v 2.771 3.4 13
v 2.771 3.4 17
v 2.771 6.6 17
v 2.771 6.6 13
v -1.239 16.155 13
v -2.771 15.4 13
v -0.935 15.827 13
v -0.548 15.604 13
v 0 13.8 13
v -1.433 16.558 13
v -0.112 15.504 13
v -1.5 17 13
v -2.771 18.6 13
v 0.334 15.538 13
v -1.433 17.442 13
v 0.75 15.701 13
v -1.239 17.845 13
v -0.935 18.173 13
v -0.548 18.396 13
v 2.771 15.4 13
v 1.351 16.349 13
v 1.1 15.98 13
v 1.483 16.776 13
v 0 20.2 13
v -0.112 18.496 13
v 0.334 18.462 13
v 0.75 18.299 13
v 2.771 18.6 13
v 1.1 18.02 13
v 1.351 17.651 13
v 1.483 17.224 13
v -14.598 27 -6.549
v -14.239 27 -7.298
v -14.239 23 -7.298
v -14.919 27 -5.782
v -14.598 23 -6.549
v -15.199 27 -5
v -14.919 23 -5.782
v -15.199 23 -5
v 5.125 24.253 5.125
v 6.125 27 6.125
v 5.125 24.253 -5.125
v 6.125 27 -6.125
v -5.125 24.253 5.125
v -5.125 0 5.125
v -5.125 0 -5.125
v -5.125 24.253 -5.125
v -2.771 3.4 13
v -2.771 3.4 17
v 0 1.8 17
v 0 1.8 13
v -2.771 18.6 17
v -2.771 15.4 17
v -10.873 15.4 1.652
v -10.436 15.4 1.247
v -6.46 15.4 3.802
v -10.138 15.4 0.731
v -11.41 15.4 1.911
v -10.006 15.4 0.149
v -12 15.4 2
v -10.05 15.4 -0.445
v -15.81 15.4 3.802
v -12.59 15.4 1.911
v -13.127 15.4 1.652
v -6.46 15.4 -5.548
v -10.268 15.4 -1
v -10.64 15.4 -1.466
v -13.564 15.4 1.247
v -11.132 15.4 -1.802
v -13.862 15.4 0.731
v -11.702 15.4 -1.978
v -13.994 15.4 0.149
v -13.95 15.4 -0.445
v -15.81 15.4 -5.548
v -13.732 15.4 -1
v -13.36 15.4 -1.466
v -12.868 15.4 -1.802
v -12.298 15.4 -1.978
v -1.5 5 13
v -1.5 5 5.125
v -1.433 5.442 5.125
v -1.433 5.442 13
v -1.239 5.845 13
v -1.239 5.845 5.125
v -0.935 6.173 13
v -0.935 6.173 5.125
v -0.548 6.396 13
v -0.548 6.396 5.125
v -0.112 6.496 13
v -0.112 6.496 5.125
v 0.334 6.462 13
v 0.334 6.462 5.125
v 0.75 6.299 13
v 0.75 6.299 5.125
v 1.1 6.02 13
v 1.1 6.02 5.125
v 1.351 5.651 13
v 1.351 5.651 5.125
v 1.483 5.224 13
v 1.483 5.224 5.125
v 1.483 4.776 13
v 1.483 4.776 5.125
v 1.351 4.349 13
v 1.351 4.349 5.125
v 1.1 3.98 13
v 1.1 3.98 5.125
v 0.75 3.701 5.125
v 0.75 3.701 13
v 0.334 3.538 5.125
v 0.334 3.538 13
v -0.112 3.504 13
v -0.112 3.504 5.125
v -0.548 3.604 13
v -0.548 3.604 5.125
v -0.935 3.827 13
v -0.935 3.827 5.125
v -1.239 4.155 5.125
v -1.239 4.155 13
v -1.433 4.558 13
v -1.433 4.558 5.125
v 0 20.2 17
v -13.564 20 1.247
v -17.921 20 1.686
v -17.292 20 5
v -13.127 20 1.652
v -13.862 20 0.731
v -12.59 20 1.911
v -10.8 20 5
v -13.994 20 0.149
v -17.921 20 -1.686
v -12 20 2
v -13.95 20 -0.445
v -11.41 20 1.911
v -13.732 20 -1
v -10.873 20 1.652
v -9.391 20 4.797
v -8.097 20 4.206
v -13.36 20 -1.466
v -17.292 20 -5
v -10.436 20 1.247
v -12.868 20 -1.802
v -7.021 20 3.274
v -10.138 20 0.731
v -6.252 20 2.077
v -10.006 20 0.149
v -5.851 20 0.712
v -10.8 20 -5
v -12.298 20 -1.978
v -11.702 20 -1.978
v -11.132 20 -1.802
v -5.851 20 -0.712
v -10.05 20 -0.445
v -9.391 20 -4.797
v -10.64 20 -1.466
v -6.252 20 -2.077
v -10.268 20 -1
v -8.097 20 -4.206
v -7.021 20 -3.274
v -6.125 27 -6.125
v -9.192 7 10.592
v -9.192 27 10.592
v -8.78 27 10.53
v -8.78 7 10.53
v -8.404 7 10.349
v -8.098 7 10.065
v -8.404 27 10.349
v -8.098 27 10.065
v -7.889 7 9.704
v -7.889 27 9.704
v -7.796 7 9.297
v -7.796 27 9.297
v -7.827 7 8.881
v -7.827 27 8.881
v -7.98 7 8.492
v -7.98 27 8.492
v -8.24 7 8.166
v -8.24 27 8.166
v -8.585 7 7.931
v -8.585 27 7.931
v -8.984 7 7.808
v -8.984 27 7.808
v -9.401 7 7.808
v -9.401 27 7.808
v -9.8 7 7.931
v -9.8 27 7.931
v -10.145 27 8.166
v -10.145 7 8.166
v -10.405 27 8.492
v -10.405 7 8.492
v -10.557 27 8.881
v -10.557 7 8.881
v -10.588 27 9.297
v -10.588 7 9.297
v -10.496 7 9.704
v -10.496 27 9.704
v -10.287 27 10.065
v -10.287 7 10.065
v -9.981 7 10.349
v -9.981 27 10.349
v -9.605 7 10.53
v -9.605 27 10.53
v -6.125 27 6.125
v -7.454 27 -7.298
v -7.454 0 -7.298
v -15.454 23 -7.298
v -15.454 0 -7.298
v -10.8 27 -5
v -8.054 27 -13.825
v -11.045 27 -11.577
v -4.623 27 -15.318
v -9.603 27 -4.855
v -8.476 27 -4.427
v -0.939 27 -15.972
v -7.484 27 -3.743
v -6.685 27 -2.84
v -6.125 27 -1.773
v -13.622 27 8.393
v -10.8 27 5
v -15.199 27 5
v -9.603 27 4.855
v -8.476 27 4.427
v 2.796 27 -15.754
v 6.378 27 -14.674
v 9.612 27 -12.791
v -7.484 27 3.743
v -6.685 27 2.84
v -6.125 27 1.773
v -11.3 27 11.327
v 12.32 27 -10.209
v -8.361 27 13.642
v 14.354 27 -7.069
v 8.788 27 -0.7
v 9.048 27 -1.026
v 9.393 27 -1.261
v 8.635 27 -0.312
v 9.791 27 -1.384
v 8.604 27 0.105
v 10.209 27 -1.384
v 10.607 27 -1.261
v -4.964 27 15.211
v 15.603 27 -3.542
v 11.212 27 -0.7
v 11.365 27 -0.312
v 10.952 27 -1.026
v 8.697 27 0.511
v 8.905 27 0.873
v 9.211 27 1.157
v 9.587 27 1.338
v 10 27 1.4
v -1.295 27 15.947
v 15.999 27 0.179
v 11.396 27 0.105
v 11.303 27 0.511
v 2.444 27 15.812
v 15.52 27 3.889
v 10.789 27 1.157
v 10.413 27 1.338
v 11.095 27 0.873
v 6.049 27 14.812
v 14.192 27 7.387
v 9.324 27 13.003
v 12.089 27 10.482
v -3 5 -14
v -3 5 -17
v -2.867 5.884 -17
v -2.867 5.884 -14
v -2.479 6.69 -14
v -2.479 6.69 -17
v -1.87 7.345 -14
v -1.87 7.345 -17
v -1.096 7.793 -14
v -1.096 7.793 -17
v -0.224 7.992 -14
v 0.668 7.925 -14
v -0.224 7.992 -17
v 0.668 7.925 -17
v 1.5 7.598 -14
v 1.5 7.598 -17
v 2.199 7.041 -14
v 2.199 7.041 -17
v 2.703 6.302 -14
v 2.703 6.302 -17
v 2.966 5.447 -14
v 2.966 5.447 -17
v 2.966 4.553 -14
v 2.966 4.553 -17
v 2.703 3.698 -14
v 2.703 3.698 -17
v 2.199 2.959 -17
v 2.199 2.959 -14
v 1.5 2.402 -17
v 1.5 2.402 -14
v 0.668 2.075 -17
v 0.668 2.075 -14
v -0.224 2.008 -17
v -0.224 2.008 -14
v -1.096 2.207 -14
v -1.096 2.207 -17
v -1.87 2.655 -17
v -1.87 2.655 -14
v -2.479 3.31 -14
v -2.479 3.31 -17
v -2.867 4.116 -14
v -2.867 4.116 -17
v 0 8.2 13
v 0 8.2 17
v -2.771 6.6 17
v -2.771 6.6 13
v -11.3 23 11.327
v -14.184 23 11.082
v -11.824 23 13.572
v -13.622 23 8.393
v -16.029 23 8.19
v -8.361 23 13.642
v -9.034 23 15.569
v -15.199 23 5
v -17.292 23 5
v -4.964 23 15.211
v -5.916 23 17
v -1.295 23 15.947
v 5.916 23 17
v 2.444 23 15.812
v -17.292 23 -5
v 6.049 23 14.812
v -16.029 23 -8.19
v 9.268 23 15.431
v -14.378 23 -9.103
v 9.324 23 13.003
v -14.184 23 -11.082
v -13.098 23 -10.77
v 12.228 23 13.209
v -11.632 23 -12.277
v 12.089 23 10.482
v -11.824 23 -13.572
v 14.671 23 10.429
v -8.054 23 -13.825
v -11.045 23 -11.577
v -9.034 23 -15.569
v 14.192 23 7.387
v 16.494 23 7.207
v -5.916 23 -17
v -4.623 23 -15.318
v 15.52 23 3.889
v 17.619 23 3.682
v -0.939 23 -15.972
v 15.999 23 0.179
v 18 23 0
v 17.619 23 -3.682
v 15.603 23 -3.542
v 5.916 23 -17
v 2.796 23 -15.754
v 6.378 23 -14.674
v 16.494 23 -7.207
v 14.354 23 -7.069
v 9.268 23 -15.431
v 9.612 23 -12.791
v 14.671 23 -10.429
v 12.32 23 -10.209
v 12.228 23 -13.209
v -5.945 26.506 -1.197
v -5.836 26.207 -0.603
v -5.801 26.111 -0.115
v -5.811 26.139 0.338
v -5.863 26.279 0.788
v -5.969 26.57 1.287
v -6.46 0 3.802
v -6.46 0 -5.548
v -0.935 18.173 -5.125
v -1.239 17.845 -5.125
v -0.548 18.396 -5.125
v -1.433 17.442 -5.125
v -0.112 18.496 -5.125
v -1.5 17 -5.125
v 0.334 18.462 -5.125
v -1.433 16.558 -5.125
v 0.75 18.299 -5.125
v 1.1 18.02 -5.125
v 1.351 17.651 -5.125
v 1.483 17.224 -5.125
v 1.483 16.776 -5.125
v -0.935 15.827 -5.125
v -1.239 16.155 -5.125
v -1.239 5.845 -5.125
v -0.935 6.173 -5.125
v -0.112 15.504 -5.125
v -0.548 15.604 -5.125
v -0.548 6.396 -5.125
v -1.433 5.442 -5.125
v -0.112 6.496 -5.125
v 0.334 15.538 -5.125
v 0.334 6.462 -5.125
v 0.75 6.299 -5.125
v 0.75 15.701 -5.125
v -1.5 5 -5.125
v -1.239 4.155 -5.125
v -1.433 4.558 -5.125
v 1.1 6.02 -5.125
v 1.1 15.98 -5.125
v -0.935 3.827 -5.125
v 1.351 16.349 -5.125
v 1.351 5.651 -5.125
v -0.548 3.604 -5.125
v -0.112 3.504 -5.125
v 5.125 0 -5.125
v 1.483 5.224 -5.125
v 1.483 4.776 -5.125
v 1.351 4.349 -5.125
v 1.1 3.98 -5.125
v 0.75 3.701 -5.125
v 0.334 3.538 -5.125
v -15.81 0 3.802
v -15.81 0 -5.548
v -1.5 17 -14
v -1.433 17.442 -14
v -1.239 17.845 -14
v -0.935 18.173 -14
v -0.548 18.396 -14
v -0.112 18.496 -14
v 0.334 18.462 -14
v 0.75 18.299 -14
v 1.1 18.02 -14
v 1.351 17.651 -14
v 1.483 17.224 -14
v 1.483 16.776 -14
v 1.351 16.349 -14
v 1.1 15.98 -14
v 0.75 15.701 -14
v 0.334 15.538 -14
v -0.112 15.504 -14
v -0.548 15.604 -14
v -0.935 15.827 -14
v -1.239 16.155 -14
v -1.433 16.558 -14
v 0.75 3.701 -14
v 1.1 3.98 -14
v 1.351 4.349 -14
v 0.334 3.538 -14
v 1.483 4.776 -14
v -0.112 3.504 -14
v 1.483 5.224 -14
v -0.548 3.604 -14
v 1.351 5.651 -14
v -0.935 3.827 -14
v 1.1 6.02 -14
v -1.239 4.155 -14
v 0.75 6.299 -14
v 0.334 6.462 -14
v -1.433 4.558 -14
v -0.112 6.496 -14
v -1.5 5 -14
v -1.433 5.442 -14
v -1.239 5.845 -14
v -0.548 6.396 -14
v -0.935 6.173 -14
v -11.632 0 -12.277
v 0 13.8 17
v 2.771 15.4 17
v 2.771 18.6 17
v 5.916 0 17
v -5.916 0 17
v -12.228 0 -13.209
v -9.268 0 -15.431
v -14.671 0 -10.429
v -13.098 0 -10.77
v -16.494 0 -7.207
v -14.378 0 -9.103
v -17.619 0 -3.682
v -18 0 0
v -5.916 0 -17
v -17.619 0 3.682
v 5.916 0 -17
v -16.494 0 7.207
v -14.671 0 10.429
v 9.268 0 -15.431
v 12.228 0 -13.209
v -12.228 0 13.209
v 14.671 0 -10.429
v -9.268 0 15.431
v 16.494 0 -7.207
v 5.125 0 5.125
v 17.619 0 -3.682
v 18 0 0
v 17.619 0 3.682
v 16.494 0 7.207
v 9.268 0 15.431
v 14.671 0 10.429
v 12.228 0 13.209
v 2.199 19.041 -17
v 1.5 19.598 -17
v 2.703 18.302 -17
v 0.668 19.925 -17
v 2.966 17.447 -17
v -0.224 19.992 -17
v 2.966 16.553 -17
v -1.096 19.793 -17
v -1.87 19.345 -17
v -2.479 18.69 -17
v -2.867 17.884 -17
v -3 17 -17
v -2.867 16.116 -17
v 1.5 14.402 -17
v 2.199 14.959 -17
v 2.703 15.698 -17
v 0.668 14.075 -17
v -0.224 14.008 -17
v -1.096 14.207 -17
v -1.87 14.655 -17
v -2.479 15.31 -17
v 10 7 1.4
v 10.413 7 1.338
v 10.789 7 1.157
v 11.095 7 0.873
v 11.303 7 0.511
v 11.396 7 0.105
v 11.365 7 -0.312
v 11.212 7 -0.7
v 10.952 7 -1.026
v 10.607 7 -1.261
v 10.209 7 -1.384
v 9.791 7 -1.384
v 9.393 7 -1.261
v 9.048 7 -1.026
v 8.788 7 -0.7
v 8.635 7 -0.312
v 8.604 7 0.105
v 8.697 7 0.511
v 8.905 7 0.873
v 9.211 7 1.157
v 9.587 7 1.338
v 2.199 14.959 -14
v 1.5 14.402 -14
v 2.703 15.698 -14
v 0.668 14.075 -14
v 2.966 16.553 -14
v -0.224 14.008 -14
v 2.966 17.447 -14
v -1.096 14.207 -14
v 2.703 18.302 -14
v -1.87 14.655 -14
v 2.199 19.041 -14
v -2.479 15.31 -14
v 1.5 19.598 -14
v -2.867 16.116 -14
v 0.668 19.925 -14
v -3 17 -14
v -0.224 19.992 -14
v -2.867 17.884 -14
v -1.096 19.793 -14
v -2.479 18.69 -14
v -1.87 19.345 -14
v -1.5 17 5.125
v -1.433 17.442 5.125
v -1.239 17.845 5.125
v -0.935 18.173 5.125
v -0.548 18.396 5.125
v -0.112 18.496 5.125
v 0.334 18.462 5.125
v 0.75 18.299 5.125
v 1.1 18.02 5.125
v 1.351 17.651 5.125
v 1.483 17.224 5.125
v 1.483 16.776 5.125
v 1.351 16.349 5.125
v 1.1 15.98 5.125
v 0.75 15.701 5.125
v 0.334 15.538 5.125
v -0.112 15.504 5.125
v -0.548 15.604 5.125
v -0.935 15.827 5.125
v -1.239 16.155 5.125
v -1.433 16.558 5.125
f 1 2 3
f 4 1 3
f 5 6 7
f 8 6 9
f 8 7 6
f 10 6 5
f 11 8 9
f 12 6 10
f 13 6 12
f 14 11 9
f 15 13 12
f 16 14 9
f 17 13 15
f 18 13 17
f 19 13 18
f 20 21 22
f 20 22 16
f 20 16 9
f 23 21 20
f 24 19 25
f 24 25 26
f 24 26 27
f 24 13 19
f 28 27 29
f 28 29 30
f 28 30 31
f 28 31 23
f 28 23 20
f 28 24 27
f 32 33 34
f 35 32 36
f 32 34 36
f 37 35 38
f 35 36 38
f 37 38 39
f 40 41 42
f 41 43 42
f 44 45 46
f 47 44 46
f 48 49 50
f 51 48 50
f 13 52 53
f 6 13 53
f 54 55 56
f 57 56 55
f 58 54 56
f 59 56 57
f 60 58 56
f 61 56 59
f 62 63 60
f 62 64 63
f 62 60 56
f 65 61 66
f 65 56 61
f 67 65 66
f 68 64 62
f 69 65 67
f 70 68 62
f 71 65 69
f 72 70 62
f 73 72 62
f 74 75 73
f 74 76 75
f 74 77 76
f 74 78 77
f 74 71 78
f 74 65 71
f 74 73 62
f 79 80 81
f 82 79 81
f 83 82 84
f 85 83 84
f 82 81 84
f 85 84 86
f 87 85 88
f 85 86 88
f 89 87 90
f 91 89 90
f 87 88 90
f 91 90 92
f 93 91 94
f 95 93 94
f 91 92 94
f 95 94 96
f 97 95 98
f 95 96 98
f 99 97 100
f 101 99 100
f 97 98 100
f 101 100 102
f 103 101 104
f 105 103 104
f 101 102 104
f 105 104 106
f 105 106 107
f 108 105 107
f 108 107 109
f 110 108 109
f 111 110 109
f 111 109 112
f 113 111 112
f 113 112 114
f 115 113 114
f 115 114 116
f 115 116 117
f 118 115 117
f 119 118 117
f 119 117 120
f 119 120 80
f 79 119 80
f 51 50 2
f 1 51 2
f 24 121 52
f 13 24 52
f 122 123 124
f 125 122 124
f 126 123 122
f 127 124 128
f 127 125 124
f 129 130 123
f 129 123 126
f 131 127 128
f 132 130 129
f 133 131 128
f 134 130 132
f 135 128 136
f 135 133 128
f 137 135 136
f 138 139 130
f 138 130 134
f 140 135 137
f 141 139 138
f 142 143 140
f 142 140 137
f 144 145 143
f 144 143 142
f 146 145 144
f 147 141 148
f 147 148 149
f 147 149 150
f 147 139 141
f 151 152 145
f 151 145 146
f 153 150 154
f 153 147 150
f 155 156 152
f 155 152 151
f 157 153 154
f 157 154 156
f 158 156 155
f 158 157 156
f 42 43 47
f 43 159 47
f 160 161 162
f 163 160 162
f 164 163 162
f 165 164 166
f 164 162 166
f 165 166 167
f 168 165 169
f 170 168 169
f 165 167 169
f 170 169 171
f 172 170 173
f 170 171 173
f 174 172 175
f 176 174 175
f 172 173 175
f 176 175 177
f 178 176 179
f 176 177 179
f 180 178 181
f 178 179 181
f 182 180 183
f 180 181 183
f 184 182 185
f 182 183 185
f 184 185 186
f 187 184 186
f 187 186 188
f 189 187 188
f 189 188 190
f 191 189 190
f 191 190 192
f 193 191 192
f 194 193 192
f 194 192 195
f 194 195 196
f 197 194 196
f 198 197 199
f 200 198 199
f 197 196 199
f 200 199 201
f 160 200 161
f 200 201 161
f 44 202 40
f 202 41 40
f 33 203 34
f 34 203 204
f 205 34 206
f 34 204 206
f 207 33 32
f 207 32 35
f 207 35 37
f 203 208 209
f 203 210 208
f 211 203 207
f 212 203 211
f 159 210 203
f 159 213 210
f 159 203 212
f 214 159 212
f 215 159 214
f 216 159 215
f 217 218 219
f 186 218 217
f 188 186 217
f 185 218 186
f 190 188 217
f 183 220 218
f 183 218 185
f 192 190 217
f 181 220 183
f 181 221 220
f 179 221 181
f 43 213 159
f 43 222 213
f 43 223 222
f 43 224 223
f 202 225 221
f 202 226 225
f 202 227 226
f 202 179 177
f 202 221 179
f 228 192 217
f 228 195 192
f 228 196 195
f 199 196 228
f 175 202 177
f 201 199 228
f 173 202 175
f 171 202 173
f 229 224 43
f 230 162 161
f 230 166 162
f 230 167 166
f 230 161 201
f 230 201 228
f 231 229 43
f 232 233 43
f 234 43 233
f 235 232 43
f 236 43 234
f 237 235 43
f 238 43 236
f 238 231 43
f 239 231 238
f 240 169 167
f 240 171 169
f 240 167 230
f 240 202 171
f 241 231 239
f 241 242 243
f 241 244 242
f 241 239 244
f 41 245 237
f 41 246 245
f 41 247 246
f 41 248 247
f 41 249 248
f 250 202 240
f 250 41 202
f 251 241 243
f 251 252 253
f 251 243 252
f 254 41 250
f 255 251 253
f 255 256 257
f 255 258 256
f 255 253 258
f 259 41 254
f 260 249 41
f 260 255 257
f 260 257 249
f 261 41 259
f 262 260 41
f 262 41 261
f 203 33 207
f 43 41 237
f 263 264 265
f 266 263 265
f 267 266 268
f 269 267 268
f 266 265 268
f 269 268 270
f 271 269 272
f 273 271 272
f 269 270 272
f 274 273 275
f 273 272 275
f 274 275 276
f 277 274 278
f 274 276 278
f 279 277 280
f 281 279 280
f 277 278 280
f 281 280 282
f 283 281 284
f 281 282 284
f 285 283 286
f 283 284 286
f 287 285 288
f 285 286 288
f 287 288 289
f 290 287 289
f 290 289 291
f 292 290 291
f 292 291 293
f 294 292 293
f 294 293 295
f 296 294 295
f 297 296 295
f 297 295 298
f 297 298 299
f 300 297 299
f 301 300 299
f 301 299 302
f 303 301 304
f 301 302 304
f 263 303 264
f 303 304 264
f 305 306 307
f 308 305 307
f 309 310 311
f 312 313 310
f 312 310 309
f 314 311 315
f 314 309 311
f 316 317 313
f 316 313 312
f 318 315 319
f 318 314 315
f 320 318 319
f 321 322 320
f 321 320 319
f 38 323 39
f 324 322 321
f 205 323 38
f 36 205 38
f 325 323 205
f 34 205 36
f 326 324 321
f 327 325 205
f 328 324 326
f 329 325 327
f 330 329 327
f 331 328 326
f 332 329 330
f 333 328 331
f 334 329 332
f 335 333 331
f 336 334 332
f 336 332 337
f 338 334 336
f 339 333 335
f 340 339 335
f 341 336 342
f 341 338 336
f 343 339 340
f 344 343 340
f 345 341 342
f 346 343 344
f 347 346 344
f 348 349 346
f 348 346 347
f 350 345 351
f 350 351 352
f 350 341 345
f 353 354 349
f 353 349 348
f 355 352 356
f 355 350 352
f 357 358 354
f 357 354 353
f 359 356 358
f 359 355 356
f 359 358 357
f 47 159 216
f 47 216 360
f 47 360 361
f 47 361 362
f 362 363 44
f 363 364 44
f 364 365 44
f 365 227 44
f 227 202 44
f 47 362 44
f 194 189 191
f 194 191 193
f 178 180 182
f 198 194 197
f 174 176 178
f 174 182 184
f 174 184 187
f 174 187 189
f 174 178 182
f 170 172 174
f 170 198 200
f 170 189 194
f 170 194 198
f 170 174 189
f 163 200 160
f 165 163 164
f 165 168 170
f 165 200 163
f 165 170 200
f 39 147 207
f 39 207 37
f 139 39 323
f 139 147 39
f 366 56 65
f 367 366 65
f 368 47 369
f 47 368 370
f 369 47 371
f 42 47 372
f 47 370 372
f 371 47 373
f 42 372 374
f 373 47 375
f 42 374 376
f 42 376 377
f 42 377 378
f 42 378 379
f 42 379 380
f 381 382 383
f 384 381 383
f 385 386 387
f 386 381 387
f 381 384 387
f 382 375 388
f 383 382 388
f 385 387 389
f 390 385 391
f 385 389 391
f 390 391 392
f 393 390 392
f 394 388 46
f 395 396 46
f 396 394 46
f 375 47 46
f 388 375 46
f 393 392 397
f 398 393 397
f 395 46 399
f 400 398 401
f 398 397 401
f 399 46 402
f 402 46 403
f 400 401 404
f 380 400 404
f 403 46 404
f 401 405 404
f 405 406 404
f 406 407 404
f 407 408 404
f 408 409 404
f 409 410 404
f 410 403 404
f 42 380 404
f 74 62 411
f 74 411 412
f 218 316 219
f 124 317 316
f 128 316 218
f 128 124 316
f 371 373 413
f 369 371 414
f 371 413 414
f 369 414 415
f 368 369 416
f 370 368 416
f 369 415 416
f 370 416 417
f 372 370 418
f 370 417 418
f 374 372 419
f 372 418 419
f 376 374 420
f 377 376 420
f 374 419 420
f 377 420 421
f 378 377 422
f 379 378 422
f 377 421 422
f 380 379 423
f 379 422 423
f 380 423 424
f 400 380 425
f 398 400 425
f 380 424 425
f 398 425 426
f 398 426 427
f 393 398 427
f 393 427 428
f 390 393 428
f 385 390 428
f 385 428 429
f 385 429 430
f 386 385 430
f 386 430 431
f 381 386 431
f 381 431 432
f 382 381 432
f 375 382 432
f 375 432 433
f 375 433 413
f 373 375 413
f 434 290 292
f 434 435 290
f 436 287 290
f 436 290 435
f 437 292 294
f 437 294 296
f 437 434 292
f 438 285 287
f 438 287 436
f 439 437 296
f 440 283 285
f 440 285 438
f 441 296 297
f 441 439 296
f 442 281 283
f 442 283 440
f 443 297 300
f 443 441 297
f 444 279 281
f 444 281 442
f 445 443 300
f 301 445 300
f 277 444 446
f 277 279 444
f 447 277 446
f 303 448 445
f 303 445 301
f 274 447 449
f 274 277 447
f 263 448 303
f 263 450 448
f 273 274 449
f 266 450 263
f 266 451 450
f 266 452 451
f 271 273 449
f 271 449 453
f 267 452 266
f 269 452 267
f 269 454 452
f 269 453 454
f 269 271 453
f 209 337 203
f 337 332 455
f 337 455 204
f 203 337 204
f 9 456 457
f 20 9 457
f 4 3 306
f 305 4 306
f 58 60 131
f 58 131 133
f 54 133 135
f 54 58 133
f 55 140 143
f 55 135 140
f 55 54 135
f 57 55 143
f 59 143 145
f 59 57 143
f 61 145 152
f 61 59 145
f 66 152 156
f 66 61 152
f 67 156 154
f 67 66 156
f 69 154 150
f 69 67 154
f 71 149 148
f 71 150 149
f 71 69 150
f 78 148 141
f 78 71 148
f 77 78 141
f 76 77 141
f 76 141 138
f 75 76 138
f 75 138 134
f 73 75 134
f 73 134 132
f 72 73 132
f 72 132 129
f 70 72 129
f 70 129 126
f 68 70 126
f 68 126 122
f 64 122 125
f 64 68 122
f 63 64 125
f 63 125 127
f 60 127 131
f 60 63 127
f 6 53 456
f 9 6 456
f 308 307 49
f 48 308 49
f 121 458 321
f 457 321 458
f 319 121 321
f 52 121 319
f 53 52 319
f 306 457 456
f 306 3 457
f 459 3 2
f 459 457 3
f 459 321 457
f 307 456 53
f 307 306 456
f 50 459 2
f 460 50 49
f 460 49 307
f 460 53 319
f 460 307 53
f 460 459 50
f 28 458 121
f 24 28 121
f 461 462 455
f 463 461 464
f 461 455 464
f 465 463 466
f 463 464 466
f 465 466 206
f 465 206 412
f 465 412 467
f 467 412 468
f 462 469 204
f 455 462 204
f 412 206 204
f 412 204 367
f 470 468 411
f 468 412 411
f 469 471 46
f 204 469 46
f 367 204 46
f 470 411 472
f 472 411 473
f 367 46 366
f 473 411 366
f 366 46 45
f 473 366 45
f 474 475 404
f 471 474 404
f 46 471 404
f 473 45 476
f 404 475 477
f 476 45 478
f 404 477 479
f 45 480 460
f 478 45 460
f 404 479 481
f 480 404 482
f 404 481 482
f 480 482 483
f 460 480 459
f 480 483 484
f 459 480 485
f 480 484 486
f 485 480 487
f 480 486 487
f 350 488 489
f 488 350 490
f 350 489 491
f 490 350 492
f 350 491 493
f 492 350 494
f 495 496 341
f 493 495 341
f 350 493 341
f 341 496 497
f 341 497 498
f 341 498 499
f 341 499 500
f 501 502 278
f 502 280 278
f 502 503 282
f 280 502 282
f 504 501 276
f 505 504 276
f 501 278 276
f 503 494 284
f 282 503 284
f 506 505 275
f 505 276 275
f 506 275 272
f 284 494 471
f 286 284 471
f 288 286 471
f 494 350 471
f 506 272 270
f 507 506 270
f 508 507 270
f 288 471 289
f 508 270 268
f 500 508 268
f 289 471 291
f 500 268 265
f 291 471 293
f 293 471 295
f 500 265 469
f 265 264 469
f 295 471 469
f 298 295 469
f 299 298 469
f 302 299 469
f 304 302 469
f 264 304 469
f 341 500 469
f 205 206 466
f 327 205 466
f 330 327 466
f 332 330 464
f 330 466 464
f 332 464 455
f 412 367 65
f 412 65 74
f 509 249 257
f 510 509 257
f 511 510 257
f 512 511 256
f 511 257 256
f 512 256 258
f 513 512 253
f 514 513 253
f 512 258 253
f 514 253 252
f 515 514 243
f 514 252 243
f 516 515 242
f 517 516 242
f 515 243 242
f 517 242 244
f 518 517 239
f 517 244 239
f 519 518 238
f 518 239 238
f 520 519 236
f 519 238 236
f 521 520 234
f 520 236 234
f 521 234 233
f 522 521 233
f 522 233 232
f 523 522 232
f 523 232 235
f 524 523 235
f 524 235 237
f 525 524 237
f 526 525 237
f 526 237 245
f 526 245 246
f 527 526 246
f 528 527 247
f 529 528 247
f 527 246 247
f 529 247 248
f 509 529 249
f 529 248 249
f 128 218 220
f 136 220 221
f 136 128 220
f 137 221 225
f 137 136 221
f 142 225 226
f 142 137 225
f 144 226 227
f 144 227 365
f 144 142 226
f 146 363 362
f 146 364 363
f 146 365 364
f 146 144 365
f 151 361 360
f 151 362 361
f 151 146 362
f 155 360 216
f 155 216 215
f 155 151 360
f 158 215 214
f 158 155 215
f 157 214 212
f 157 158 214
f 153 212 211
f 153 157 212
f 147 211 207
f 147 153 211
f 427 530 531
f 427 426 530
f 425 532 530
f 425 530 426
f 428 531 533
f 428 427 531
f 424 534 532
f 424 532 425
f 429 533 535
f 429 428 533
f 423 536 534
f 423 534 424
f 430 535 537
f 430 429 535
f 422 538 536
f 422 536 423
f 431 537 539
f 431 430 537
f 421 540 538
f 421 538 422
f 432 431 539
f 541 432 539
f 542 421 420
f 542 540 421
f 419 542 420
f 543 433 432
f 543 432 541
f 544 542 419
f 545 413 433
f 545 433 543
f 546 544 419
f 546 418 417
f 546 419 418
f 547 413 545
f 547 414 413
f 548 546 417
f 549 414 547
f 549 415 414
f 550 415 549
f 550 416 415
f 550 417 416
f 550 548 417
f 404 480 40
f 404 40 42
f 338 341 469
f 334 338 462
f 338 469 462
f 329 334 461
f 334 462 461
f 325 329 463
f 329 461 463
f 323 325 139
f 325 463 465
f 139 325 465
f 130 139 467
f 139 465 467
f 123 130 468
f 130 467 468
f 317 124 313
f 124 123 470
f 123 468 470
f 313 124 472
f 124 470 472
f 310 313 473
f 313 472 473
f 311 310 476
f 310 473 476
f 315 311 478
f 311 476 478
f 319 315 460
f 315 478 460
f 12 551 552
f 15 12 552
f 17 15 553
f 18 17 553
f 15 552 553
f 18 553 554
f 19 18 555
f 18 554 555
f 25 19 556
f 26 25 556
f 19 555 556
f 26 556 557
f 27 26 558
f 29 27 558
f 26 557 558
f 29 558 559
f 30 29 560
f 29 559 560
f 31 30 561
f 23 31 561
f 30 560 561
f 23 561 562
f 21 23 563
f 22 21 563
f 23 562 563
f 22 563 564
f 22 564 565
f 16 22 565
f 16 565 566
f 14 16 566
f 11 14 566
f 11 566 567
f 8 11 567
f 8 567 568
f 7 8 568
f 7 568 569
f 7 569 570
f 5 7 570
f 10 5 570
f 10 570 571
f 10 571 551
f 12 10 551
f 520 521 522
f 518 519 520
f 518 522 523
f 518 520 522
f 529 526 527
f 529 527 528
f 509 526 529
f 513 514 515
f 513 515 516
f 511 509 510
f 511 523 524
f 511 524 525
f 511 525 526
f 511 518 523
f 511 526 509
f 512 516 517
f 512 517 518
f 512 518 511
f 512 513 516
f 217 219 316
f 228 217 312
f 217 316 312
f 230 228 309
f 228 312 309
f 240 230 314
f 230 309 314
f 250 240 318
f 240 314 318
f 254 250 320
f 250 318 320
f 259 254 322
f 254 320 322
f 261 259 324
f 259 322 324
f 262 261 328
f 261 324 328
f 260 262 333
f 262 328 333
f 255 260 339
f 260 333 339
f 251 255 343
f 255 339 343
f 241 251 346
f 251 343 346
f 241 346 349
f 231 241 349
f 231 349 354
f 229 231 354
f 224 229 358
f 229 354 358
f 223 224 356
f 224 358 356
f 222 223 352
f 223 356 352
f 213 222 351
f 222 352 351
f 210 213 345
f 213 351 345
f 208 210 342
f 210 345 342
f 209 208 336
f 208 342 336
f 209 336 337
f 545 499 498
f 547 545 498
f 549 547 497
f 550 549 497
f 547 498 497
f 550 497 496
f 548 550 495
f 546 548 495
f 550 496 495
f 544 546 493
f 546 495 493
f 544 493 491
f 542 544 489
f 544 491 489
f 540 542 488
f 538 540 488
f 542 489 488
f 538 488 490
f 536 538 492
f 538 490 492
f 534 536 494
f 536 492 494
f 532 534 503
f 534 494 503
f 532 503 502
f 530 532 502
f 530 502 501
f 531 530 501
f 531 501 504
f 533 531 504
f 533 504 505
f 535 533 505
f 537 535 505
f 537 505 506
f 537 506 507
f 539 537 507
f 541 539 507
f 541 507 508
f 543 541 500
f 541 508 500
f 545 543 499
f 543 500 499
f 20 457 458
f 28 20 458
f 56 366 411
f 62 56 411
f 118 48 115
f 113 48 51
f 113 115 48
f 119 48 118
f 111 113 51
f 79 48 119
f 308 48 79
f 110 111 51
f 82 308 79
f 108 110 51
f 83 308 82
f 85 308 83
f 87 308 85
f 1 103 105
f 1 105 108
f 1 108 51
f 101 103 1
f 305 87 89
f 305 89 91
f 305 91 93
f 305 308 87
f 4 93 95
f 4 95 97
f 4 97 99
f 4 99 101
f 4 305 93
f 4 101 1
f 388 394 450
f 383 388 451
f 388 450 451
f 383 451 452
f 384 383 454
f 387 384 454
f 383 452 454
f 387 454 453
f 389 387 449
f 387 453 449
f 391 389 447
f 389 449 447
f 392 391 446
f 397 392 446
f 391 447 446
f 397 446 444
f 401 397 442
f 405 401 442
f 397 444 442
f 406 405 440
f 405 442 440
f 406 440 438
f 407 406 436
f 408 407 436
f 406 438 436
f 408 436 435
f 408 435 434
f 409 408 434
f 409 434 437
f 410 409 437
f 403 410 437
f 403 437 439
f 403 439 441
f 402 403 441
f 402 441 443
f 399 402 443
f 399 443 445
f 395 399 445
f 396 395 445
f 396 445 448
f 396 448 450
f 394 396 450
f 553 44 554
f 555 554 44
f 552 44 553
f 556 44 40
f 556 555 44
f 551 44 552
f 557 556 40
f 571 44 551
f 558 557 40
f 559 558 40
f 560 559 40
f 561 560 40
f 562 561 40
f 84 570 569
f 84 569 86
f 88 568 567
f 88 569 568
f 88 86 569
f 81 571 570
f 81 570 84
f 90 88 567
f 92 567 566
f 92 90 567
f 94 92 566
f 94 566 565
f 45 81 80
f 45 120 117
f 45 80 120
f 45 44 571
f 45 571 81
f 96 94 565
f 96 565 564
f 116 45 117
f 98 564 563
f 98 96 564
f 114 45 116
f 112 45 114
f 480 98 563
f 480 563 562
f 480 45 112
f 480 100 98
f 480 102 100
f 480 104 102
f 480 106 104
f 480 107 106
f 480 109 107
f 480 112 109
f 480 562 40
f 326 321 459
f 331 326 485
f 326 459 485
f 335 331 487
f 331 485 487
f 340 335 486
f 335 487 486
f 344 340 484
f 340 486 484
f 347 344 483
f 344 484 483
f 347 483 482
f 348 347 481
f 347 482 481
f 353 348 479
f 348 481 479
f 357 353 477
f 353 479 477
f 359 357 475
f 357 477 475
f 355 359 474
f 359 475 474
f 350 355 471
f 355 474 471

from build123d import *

# Parameters (mm, degrees)
SKETCH1_R           = 18
SKETCH1_R_2         = 2
SKETCH1_W           = 10.25
SKETCH1_H           = 10.25
BOSS_EXTRUDE1_DEPTH = 27
CUT_EXTRUDE1_START  = -7
CUT_EXTRUDE1_DEPTH  = 7
SKETCH4_W           = 9.35
SKETCH4_H           = 9.35
CUT_EXTRUDE3_DEPTH  = 15.4
CUT_EXTRUDE4_START  = -40
CUT_EXTRUDE4_DEPTH  = 40
SKETCH6_R           = 1.5
CUT_EXTRUDE5_DEPTH  = 48
SKETCH7_R           = 3
CUT_EXTRUDE6_DEPTH  = 3
CUT_EXTRUDE7_DEPTH  = 4
CHAMFER1_SIZE       = 1
CHAMFER1_SIZE_2     = 2.747477419
CUT_EXTRUDE8_DEPTH  = 37.633318168
SKETCH12_R          = 1.4
CUT_EXTRUDE10_DEPTH = 20
CUT_EXTRUDE9_START  = -4
SKETCH10_R          = 18
SKETCH10_R_2        = 16
CUT_EXTRUDE9_DEPTH  = 4


with BuildPart() as part:
    # Sketch1 → Boss-Extrude1 (new body)
    with BuildSketch(Plane(origin=(0, 0, 0), x_dir=(1, 0, 0), z_dir=(0, 1, 0))):
        with Locations(Location((0, 0, 0), (0, 0, 270))):
            Circle(SKETCH1_R)
        with Locations(Location((-12, 0, 0), (0, 0, 270))):
            Circle(SKETCH1_R_2, mode=Mode.SUBTRACT)
        Rectangle(SKETCH1_W, SKETCH1_H, mode=Mode.SUBTRACT)
    extrude(amount=BOSS_EXTRUDE1_DEPTH)

    # Sketch2 → Cut-Extrude1 (cut)
    with BuildSketch(Plane(origin=(0, 27, 0), x_dir=(1, 0, 0), z_dir=(0, 1, 0)).offset(CUT_EXTRUDE1_START)):
        with BuildLine():
            Line((-10.8, 5), (-17.291616466, 5))
            ThreePointArc((-17.291616466, 5), (-18, 0), (-17.291616466, -5))
            Line((-17.291616466, -5), (-10.8, -5))
            ThreePointArc((-10.8, -5), (-5.8, 0), (-10.8, 5))
        make_face()
    extrude(amount=CUT_EXTRUDE1_DEPTH, mode=Mode.SUBTRACT)

    # Sketch4 → Cut-Extrude3 (cut)
    with BuildSketch(Plane(origin=(0, 0, 0), x_dir=(-1, 0, 0), z_dir=(0, -1, 0))):
        with Locations((11.135393506, 0.872889968)):
            Rectangle(SKETCH4_W, SKETCH4_H)
    extrude(amount=-CUT_EXTRUDE3_DEPTH, mode=Mode.SUBTRACT)

    # Sketch5 → Cut-Extrude4 (cut)
    with BuildSketch(Plane(origin=(0, 27, 0), x_dir=(1, 0, 0), z_dir=(0, 1, 0)).offset(CUT_EXTRUDE4_START)):
        with BuildLine():
            Line((5.916079783, 17), (-5.916079783, 17))
            ThreePointArc((-5.916079783, 17), (0, 18), (5.916079783, 17))
        make_face()
        with BuildLine():
            Line((5.916079783, -17), (-5.916079783, -17))
            ThreePointArc((-5.916079783, -17), (0, -18), (5.916079783, -17))
        make_face()
    extrude(amount=CUT_EXTRUDE4_DEPTH, mode=Mode.SUBTRACT)

    # Sketch6 → Cut-Extrude5 (cut, through all)
    with BuildSketch(Plane(origin=(0, 0, -17), x_dir=(-1, 0, 0), z_dir=(0, 0, -1))):
        with Locations((0, 17)):
            Circle(SKETCH6_R)
        with Locations((0, 5)):
            Circle(SKETCH6_R)
    extrude(amount=-CUT_EXTRUDE5_DEPTH, mode=Mode.SUBTRACT)

    # Sketch7 → Cut-Extrude6 (cut)
    with BuildSketch(Plane(origin=(0, 0, -17), x_dir=(-1, 0, 0), z_dir=(0, 0, -1))):
        with Locations((0, 17)):
            Circle(SKETCH7_R)
        with Locations((0, 5)):
            Circle(SKETCH7_R)
    extrude(amount=-CUT_EXTRUDE6_DEPTH, mode=Mode.SUBTRACT)

    # Sketch8 → Cut-Extrude7 (cut)
    with BuildSketch(Plane.XY.offset(17)):
        Polygon((0, 13.8), (2.771281292, 15.4), (2.771281292, 18.6), (0, 20.2), (-2.771281292, 18.6), (-2.771281292, 15.4), align=None)
        Polygon((0, 1.8), (2.771281292, 3.4), (2.771281292, 6.6), (0, 8.2), (-2.771281292, 6.6), (-2.771281292, 3.4), align=None)
    extrude(amount=-CUT_EXTRUDE7_DEPTH, mode=Mode.SUBTRACT)

    # Chamfer1
    # the kernel refuses this chamfer: 2.747477419, 1 mm, written as the material it takes off along each edge
    with BuildSketch(Plane(origin=(-5.125, 27, -5.125), x_dir=(0, 0.09904090225204956, -0.9950833631817488), z_dir=(1, 0, 0)), Plane(origin=(-5.125, 27, 5.125), x_dir=(-0.9950833631817488, 0.09904090225204956, 0), z_dir=(0, 0, -1)), Plane(origin=(5.125, 27, 5.125), x_dir=(0, 0.09904090225204956, 0.9950833631817488), z_dir=(-1, 0, 0)), Plane(origin=(5.125, 27, -5.125), x_dir=(0.9950833631817488, 0.09904090225204956, 0), z_dir=(0, 0, 1))) as chamfer1_piece_1:
        Polygon((CHAMFER1_SIZE * 0.995083363182, -CHAMFER1_SIZE * 0.099040902252), (-CHAMFER1_SIZE_2 * 0.0990409022684, -CHAMFER1_SIZE_2 * 0.995083363346), (0, 0), align=None)
    extrude(amount=10.25, mode=Mode.SUBTRACT)
    with BuildSketch(Plane(origin=(-5.125, 27, 5.125), x_dir=(-0.9950833631817488, 0.09904090225204956, 0), z_dir=(0, 0, -1))) as chamfer1_piece_2a_section:
        Polygon((CHAMFER1_SIZE * 0.995083363182, -CHAMFER1_SIZE * 0.099040902252), (-CHAMFER1_SIZE_2 * 0.0990409022684, -CHAMFER1_SIZE_2 * 0.995083363346), (0, 0), align=None)
    chamfer1_piece_2a = extrude(amount=17.377491449, mode=Mode.PRIVATE)
    chamfer1_piece_2a = split(chamfer1_piece_2a, bisect_by=Plane(origin=(-5.432505006, 26.059901151, -5.125), z_dir=(0, 0, -1)), keep=Keep.TOP, mode=Mode.PRIVATE)
    with BuildSketch(Plane(origin=(-12.252491449, 27, -5.125), x_dir=(0, 0.09904090225204956, -0.9950833631817488), z_dir=(1, 0, 0))) as chamfer1_piece_2b_section:
        Polygon((CHAMFER1_SIZE * 0.995083363182, -CHAMFER1_SIZE * 0.099040902252), (-CHAMFER1_SIZE_2 * 0.0990409022684, -CHAMFER1_SIZE_2 * 0.995083363346), (0, 0), align=None)
    chamfer1_piece_2b = extrude(amount=17.377491449, mode=Mode.PRIVATE)
    chamfer1_piece_2b = split(chamfer1_piece_2b, bisect_by=Plane(origin=(-5.125, 26.059901151, -5.432505006), z_dir=(-1, 0, 0)), keep=Keep.TOP, mode=Mode.PRIVATE)
    chamfer1_piece_2 = chamfer1_piece_2a & chamfer1_piece_2b
    add(chamfer1_piece_2, mode=Mode.SUBTRACT)
    with BuildSketch(Plane(origin=(5.125, 27, -12.252491449), x_dir=(0.9950833631817488, 0.09904090225204956, 0), z_dir=(0, 0, 1))) as chamfer1_piece_3a_section:
        Polygon((CHAMFER1_SIZE * 0.995083363182, -CHAMFER1_SIZE * 0.099040902252), (-CHAMFER1_SIZE_2 * 0.0990409022684, -CHAMFER1_SIZE_2 * 0.995083363346), (0, 0), align=None)
    chamfer1_piece_3a = extrude(amount=17.377491449, mode=Mode.PRIVATE)
    chamfer1_piece_3a = split(chamfer1_piece_3a, bisect_by=Plane(origin=(5.432505006, 26.059901151, -5.125), z_dir=(0, 0, -1)), keep=Keep.TOP, mode=Mode.PRIVATE)
    with BuildSketch(Plane(origin=(-5.125, 27, -5.125), x_dir=(0, 0.09904090225204956, -0.9950833631817488), z_dir=(1, 0, 0))) as chamfer1_piece_3b_section:
        Polygon((CHAMFER1_SIZE * 0.995083363182, -CHAMFER1_SIZE * 0.099040902252), (-CHAMFER1_SIZE_2 * 0.0990409022684, -CHAMFER1_SIZE_2 * 0.995083363346), (0, 0), align=None)
    chamfer1_piece_3b = extrude(amount=17.377491449, mode=Mode.PRIVATE)
    chamfer1_piece_3b = split(chamfer1_piece_3b, bisect_by=Plane(origin=(5.125, 26.059901151, -5.432505006), z_dir=(1, 0, 0)), keep=Keep.TOP, mode=Mode.PRIVATE)
    chamfer1_piece_3 = chamfer1_piece_3a & chamfer1_piece_3b
    add(chamfer1_piece_3, mode=Mode.SUBTRACT)
    with BuildSketch(Plane(origin=(5.125, 27, 5.125), x_dir=(0, 0.09904090225204956, 0.9950833631817488), z_dir=(-1, 0, 0))) as chamfer1_piece_4a_section:
        Polygon((CHAMFER1_SIZE * 0.995083363182, -CHAMFER1_SIZE * 0.099040902252), (-CHAMFER1_SIZE_2 * 0.0990409022684, -CHAMFER1_SIZE_2 * 0.995083363346), (0, 0), align=None)
    chamfer1_piece_4a = extrude(amount=17.377491449, mode=Mode.PRIVATE)
    chamfer1_piece_4a = split(chamfer1_piece_4a, bisect_by=Plane(origin=(-5.125, 26.059901151, 5.432505006), z_dir=(-1, 0, 0)), keep=Keep.TOP, mode=Mode.PRIVATE)
    with BuildSketch(Plane(origin=(-5.125, 27, 12.252491449), x_dir=(-0.9950833631817488, 0.09904090225204956, 0), z_dir=(0, 0, -1))) as chamfer1_piece_4b_section:
        Polygon((CHAMFER1_SIZE * 0.995083363182, -CHAMFER1_SIZE * 0.099040902252), (-CHAMFER1_SIZE_2 * 0.0990409022684, -CHAMFER1_SIZE_2 * 0.995083363346), (0, 0), align=None)
    chamfer1_piece_4b = extrude(amount=17.377491449, mode=Mode.PRIVATE)
    chamfer1_piece_4b = split(chamfer1_piece_4b, bisect_by=Plane(origin=(-5.432505006, 26.059901151, 5.125), z_dir=(0, 0, 1)), keep=Keep.TOP, mode=Mode.PRIVATE)
    chamfer1_piece_4 = chamfer1_piece_4a & chamfer1_piece_4b
    add(chamfer1_piece_4, mode=Mode.SUBTRACT)
    with BuildSketch(Plane(origin=(12.252491449, 27, 5.125), x_dir=(0, 0.09904090225204956, 0.9950833631817488), z_dir=(-1, 0, 0))) as chamfer1_piece_5a_section:
        Polygon((CHAMFER1_SIZE * 0.995083363182, -CHAMFER1_SIZE * 0.099040902252), (-CHAMFER1_SIZE_2 * 0.0990409022684, -CHAMFER1_SIZE_2 * 0.995083363346), (0, 0), align=None)
    chamfer1_piece_5a = extrude(amount=17.377491449, mode=Mode.PRIVATE)
    chamfer1_piece_5a = split(chamfer1_piece_5a, bisect_by=Plane(origin=(5.125, 26.059901151, 5.432505006), z_dir=(1, 0, 0)), keep=Keep.TOP, mode=Mode.PRIVATE)
    with BuildSketch(Plane(origin=(5.125, 27, -5.125), x_dir=(0.9950833631817488, 0.09904090225204956, 0), z_dir=(0, 0, 1))) as chamfer1_piece_5b_section:
        Polygon((CHAMFER1_SIZE * 0.995083363182, -CHAMFER1_SIZE * 0.099040902252), (-CHAMFER1_SIZE_2 * 0.0990409022684, -CHAMFER1_SIZE_2 * 0.995083363346), (0, 0), align=None)
    chamfer1_piece_5b = extrude(amount=17.377491449, mode=Mode.PRIVATE)
    chamfer1_piece_5b = split(chamfer1_piece_5b, bisect_by=Plane(origin=(5.432505006, 26.059901151, 5.125), z_dir=(0, 0, 1)), keep=Keep.TOP, mode=Mode.PRIVATE)
    chamfer1_piece_5 = chamfer1_piece_5a & chamfer1_piece_5b
    add(chamfer1_piece_5, mode=Mode.SUBTRACT)

    # Sketch9 → Cut-Extrude8 (cut, through all)
    with BuildSketch(Plane.XZ):
        with BuildLine():
            Line((-7.454203172, -7.297889968), (-15.454203172, -7.297889968))
            ThreePointArc((-15.454203172, -7.297889968), (-13.761984914, -9.955415688), (-11.632322635, -12.277178848))
            Line((-11.632322635, -12.277178848), (-7.454203172, -7.297889968))
        make_face()
    extrude(amount=-CUT_EXTRUDE8_DEPTH, mode=Mode.SUBTRACT)

    # Sketch12 → Cut-Extrude10 (cut)
    with BuildSketch(Plane(origin=(0, 27, 0), x_dir=(1, 0, 0), z_dir=(0, 1, 0))):
        with Locations(Location((10, 0, 0), (0, 0, 270))):
            Circle(SKETCH12_R)
        with Locations(Location((-9.192388155, -9.192388155, 0), (0, 0, 270))):
            Circle(SKETCH12_R)
    extrude(amount=-CUT_EXTRUDE10_DEPTH, mode=Mode.SUBTRACT)

    # Sketch10 → Cut-Extrude9 (cut)
    with BuildSketch(Plane(origin=(0, 27, 0), x_dir=(1, 0, 0), z_dir=(0, 1, 0)).offset(CUT_EXTRUDE9_START)):
        Circle(SKETCH10_R)
        Circle(SKETCH10_R_2, mode=Mode.SUBTRACT)
    extrude(amount=CUT_EXTRUDE9_DEPTH, mode=Mode.SUBTRACT)


solid = part.part
